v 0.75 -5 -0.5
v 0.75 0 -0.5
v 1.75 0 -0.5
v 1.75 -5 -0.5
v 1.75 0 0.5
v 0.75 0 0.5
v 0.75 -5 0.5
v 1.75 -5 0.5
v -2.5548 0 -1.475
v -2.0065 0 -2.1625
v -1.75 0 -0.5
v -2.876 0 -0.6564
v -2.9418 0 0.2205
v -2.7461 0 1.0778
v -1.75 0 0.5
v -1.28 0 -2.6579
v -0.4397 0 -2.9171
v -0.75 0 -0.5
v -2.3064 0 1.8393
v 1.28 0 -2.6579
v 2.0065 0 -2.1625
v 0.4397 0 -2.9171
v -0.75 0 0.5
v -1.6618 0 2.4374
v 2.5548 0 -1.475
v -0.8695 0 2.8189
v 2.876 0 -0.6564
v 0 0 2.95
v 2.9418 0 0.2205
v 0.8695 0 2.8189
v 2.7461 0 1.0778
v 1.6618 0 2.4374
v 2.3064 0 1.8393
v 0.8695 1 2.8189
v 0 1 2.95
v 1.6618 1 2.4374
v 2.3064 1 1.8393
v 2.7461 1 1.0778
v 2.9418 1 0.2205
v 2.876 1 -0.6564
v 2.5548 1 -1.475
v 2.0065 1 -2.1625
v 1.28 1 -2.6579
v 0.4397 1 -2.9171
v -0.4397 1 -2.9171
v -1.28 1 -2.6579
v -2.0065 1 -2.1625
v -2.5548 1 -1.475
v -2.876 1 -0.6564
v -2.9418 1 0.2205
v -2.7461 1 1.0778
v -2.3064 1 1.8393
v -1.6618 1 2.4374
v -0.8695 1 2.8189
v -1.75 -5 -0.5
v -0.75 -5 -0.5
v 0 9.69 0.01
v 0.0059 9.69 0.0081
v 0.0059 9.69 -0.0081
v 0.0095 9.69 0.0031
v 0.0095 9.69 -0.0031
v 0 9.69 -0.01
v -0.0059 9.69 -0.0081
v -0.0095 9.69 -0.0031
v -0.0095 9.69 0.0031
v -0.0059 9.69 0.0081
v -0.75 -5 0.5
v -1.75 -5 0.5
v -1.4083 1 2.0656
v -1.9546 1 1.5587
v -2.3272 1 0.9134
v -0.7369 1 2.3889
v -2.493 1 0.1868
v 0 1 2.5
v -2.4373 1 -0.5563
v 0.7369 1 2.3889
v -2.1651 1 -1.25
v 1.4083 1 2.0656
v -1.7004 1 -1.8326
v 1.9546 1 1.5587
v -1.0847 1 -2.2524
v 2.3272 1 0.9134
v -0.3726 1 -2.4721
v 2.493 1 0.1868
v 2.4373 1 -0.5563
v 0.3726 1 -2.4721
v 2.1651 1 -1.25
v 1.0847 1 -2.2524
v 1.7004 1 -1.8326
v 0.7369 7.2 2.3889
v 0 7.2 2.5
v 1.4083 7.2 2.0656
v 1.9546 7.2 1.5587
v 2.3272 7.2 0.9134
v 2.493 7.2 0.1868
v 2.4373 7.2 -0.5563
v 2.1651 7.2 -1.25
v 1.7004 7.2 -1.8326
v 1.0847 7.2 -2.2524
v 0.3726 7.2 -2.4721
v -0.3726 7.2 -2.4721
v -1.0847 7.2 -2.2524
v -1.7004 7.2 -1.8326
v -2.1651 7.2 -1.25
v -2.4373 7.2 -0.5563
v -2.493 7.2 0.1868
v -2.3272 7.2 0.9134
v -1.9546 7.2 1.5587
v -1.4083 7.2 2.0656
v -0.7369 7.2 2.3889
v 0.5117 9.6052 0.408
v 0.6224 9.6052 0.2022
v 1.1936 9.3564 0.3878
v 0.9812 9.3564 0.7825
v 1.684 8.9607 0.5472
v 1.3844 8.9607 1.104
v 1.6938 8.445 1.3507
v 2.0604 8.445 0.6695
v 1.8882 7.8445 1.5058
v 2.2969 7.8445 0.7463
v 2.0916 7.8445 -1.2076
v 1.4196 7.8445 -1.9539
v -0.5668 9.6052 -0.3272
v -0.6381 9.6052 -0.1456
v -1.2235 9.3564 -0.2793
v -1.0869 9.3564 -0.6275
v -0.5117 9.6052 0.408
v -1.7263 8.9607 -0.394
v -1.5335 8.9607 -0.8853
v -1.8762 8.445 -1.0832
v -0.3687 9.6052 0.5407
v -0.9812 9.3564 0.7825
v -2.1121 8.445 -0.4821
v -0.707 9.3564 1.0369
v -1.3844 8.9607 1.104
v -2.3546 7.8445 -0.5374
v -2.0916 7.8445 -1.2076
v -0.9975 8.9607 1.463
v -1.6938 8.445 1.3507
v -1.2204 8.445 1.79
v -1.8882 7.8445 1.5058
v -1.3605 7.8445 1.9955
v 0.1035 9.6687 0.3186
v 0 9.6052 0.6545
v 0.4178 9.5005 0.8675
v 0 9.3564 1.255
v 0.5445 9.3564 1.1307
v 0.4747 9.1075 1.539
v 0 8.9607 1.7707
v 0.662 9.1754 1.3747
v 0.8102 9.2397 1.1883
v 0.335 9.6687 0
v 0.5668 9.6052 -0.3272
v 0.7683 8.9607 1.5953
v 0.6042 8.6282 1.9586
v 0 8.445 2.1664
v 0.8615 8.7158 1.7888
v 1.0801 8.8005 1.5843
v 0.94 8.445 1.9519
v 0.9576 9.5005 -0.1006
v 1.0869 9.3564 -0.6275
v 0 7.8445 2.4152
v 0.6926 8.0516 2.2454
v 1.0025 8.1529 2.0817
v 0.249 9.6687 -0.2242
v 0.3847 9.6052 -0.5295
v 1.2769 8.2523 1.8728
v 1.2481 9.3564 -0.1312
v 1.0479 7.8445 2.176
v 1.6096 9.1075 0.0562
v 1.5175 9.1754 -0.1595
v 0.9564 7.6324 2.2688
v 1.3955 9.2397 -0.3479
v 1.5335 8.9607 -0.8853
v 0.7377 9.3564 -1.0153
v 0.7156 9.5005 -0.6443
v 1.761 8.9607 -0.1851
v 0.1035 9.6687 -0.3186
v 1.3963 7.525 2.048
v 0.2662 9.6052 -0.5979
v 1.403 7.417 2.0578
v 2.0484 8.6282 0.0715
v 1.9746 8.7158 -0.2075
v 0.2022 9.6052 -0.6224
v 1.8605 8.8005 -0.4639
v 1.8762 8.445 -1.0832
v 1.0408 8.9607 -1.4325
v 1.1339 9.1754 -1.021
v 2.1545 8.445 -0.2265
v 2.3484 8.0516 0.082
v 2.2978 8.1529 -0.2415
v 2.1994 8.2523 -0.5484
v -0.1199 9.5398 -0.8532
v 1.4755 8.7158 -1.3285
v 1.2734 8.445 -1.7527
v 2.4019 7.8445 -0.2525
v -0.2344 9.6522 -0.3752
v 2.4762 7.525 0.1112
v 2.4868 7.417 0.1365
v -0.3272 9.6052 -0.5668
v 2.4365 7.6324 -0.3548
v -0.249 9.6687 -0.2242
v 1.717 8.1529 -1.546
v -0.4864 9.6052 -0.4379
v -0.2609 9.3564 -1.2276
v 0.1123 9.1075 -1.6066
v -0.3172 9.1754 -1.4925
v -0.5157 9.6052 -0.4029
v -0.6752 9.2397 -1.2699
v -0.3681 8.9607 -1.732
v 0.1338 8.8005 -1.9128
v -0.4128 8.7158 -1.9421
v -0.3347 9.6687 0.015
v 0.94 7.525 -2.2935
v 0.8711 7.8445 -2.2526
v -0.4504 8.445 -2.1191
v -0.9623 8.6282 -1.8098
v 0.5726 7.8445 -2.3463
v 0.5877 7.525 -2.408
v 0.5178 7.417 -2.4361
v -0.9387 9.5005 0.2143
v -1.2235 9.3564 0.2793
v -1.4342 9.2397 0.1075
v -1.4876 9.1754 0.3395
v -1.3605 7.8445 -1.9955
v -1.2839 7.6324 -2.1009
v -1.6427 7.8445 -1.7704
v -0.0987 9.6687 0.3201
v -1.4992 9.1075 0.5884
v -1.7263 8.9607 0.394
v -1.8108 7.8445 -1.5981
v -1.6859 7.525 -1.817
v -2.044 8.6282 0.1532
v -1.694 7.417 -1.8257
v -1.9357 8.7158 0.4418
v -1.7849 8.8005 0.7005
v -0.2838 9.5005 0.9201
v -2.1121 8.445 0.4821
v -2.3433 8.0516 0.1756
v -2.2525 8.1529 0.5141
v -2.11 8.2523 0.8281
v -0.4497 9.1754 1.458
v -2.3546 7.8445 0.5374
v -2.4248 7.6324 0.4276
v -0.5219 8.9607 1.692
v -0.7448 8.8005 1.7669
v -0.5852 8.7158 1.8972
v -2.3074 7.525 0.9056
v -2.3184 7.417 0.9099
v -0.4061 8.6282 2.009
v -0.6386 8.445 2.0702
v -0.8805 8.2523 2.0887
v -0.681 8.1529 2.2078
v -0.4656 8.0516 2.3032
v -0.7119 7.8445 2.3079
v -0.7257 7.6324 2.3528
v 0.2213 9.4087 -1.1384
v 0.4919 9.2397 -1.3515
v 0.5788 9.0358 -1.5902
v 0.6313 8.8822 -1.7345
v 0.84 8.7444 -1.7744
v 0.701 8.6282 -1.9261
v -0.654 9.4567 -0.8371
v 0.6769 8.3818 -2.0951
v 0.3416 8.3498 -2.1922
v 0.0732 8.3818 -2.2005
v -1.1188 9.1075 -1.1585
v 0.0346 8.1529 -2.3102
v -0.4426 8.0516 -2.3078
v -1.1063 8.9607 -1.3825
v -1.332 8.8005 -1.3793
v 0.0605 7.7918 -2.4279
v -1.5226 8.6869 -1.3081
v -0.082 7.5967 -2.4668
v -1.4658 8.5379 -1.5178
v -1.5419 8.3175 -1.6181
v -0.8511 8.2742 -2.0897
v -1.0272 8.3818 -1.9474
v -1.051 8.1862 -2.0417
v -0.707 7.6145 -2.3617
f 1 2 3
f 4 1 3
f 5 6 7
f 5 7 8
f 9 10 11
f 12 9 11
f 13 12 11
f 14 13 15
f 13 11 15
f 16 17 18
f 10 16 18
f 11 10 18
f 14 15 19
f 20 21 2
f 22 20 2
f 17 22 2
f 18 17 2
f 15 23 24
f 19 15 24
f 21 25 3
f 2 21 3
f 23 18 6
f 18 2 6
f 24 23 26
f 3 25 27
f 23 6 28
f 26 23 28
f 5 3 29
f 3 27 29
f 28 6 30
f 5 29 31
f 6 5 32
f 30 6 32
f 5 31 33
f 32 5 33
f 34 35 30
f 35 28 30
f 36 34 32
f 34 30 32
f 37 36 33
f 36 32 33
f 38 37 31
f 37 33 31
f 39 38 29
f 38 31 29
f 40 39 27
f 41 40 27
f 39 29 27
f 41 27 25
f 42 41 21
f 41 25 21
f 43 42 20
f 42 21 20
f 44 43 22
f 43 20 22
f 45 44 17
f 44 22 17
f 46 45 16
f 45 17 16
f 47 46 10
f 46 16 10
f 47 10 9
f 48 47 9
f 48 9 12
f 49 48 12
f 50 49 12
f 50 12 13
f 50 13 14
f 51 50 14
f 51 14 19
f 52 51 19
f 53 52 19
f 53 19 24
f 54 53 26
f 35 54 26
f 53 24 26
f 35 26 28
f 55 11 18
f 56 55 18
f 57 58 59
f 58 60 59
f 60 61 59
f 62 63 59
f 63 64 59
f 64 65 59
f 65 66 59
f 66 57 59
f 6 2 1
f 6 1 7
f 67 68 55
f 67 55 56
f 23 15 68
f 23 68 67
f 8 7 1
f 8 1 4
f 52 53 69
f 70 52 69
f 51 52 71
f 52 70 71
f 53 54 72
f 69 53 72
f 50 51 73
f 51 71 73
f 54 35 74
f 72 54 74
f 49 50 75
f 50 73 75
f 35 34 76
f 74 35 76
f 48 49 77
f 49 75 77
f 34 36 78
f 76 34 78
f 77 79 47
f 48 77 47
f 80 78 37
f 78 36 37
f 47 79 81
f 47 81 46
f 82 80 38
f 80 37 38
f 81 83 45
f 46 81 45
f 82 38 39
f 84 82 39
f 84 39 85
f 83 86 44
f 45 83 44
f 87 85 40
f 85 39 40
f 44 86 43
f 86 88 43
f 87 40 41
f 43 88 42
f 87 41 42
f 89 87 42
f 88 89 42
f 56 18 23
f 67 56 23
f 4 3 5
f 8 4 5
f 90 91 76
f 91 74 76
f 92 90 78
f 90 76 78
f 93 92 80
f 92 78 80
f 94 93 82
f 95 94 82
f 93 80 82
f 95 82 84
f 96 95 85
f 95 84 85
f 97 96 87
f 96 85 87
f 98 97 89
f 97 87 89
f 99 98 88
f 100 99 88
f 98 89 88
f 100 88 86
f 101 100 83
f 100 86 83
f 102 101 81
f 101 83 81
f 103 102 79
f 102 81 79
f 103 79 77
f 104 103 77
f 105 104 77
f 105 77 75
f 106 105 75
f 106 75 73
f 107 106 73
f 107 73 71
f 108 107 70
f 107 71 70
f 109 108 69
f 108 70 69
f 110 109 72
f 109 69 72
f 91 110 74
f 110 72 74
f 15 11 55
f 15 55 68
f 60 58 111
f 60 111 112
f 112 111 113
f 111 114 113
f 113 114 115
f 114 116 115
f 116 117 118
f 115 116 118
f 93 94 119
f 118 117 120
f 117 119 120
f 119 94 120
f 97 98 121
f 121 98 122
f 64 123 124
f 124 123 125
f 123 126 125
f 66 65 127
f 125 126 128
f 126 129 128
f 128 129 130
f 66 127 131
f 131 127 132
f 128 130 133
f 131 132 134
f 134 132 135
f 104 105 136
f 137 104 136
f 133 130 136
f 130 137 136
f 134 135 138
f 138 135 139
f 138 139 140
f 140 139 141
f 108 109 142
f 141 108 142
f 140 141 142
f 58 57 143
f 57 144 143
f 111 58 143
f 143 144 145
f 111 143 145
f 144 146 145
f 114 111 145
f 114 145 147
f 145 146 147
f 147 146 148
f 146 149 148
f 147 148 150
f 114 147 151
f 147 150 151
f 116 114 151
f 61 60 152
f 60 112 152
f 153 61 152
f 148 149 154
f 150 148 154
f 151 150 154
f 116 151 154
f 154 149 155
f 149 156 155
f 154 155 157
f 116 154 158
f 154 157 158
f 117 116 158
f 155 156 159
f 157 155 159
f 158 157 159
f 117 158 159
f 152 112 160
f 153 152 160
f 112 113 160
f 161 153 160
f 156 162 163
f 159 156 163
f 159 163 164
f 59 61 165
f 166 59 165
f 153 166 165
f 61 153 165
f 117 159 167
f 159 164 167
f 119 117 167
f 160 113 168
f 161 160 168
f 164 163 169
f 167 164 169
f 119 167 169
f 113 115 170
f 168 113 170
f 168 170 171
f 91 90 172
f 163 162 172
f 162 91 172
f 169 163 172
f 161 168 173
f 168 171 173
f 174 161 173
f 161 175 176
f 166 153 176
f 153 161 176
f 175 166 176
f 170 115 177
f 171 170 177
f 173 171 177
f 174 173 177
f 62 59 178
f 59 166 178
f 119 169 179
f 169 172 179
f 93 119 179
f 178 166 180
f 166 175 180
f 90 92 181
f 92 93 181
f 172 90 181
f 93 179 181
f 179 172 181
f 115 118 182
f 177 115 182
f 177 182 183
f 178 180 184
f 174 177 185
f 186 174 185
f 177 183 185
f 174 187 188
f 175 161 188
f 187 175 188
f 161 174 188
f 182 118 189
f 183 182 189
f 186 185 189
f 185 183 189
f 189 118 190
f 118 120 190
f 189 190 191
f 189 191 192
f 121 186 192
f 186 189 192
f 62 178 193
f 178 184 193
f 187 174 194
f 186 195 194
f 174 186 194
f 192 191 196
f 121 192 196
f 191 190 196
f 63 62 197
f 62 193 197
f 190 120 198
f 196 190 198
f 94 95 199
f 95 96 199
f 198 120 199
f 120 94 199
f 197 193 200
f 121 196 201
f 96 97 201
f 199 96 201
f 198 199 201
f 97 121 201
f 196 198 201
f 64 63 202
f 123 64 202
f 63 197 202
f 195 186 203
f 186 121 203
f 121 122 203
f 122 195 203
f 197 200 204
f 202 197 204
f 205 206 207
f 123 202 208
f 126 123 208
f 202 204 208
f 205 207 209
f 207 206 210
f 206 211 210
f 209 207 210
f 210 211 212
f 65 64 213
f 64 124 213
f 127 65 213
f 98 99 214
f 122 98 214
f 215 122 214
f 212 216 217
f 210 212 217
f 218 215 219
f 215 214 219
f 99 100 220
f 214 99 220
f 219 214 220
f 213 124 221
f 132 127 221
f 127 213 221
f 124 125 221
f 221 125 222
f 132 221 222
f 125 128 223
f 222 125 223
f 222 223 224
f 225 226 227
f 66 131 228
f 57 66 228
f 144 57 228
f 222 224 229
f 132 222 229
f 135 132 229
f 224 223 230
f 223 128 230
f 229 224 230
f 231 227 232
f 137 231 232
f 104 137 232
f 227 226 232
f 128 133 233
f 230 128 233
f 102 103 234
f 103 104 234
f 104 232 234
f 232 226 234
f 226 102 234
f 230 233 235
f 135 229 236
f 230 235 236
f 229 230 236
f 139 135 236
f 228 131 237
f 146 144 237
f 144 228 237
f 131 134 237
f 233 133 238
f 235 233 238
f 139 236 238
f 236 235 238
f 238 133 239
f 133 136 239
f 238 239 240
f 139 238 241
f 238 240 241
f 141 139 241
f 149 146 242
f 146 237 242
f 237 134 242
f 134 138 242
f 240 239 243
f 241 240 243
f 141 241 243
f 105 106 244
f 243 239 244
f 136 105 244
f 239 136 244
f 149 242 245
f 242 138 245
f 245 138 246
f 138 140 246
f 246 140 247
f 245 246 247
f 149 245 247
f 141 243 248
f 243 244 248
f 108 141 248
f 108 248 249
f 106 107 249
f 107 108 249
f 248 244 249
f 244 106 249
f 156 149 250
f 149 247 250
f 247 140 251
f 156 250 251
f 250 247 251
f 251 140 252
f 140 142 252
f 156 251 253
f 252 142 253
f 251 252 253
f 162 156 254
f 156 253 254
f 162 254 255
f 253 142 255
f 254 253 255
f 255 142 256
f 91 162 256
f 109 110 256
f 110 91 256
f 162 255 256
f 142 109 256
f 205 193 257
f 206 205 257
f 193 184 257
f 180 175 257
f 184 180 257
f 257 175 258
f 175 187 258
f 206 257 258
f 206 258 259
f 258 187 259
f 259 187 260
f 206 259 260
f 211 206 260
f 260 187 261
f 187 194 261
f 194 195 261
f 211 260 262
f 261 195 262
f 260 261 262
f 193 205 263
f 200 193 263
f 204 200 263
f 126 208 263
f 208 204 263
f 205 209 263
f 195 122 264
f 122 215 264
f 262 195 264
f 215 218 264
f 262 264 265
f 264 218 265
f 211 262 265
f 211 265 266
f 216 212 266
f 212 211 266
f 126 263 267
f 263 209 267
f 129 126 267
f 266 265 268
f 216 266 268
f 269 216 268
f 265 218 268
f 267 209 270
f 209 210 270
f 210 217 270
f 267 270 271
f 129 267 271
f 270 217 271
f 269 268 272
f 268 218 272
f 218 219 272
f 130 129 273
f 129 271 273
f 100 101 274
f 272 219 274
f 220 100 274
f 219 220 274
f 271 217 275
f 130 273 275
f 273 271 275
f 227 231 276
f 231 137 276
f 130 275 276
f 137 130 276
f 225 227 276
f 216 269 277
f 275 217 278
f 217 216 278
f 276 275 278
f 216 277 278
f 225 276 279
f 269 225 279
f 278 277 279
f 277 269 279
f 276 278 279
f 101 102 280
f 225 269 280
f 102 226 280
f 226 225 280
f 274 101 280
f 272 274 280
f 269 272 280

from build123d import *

# Parameters (mm, degrees)
SKETCH2_W           = 1
SKETCH2_H           = 1
BOSS_EXTRUDE1_DEPTH = 5


with BuildPart() as part:
    # Sketch1 → Revolve1 (revolve)
    with BuildSketch(Plane(origin=(0, 0, 0), x_dir=(0, 0, -1), z_dir=(1, 0, 0))):
        with BuildLine():
            Line((0, 0), (0, 9.69))
            Line((0, 9.69), (-0.01, 9.69))
            ThreePointArc((-0.01, 9.69), (-1.770695885, 8.960695885), (-2.5, 7.2))
            Line((-2.5, 7.2), (-2.5, 1))
            Line((-2.5, 1), (-2.95, 1))
            Line((-2.95, 1), (-2.95, 0))
            Line((-2.95, 0), (0, 0))
        make_face()
    revolve(axis=Axis((0, 0, 0), (0, 1, 0)))

    # Sketch2 → Boss-Extrude1 (add)
    with BuildSketch(Plane.XZ):
        with Locations((-1.25, 0)):
            Rectangle(SKETCH2_W, SKETCH2_H)
        with Locations((1.25, 0)):
            Rectangle(SKETCH2_W, SKETCH2_H)
    extrude(amount=BOSS_EXTRUDE1_DEPTH)


solid = part.part
